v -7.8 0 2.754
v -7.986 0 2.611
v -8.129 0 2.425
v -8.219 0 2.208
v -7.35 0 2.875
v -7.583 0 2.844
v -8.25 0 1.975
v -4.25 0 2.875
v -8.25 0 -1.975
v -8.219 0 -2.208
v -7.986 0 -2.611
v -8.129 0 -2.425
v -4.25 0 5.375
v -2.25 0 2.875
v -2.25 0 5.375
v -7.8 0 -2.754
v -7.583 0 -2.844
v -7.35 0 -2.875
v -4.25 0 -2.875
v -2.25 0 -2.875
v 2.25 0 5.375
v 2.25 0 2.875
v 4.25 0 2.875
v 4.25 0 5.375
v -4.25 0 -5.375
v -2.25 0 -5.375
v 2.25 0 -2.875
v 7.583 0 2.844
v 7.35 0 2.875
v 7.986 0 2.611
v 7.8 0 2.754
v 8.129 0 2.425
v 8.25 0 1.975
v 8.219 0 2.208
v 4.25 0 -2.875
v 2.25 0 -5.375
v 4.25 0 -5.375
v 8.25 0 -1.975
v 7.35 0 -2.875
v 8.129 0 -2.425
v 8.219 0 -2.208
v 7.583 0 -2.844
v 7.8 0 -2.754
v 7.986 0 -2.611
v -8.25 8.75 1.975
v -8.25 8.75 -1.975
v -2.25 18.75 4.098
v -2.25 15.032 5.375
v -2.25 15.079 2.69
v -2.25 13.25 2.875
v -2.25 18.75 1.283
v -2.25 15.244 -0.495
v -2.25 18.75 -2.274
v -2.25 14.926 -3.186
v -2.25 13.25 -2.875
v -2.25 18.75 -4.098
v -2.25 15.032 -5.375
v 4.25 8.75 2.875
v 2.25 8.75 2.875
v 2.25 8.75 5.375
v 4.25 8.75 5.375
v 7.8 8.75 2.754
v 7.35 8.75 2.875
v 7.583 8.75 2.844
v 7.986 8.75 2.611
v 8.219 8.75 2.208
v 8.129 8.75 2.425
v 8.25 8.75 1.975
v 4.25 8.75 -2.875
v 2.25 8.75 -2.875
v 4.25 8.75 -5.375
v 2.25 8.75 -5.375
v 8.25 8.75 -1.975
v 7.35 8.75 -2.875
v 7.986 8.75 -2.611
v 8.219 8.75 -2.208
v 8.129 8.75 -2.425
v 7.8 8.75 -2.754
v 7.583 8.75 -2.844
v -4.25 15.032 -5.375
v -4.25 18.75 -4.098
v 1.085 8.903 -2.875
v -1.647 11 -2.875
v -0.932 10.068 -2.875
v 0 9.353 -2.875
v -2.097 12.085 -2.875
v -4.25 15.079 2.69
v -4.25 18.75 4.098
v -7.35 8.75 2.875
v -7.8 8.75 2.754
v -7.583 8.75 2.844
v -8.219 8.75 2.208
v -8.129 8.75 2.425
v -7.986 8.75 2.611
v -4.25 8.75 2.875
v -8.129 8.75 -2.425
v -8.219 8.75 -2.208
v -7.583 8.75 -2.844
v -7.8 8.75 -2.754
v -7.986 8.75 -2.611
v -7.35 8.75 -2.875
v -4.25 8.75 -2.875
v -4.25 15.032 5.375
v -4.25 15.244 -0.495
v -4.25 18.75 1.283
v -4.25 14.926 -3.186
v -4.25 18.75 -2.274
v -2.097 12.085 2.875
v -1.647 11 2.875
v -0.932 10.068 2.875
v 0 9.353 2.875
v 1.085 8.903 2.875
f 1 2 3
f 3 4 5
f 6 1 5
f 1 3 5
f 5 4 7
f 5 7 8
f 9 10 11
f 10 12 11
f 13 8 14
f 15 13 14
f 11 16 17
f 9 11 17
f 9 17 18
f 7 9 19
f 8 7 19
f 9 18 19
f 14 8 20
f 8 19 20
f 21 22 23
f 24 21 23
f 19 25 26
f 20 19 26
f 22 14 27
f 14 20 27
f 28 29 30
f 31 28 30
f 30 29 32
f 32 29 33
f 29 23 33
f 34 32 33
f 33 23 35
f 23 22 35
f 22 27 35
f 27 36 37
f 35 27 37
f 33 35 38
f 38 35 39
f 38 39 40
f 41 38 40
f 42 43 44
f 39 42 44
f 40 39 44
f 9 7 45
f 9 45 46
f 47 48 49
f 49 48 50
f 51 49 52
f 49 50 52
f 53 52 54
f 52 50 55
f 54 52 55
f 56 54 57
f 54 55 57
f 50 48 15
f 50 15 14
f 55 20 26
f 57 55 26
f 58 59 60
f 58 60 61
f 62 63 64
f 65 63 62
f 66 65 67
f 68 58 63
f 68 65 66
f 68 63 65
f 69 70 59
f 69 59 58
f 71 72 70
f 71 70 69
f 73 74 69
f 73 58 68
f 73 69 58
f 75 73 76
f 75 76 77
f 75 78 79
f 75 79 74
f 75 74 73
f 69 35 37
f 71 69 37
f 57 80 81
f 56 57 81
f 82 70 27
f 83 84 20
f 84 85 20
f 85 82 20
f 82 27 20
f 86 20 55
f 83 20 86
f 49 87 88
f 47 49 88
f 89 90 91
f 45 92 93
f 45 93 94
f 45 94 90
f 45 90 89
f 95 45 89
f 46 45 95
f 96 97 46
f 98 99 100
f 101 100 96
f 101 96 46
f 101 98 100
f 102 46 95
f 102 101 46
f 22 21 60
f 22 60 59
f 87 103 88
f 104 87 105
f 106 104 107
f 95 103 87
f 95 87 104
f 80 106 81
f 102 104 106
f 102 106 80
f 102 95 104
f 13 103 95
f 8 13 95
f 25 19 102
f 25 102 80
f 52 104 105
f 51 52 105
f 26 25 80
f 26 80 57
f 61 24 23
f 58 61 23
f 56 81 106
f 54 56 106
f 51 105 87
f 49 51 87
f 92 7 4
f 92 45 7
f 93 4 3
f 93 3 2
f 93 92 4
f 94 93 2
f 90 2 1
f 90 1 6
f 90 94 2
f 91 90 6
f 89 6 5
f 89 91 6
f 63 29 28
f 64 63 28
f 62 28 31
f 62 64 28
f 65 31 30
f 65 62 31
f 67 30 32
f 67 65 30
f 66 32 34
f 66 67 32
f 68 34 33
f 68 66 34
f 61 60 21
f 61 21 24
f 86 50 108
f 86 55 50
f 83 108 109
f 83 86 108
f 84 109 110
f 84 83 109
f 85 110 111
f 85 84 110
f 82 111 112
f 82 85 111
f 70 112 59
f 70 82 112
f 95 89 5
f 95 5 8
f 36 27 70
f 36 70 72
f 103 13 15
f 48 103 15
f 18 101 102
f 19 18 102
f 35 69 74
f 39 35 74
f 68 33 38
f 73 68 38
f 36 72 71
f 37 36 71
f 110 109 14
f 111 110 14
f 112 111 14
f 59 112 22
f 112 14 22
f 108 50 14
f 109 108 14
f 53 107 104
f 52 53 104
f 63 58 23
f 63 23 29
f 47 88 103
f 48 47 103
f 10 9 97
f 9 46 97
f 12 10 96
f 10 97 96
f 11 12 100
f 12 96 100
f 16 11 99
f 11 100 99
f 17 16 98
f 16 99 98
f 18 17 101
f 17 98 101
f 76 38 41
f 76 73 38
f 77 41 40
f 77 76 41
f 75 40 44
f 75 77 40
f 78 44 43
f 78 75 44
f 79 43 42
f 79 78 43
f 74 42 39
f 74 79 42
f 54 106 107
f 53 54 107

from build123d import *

# Parameters (mm, degrees)
SKETCH1_W           = 4
SKETCH1_H           = 5.75
SKETCH1_W_2         = 2
SKETCH1_H_2         = 2.5
SKETCH1_W_3         = 2.25
BOSS_EXTRUDE1_DEPTH = 8.75
FILLET1_R           = 0.9
SKETCH2_W           = 2
SKETCH2_H           = 10.75
BOSS_EXTRUDE2_DEPTH = 10
CUT_EXTRUDE1_DEPTH  = 13.5
FILLET2_R           = 4.5


with BuildPart() as part:
    # Sketch1 → Boss-Extrude1 (new body)
    with BuildSketch(Plane(origin=(0, 0, 0), x_dir=(1, 0, 0), z_dir=(0, 1, 0))):
        with Locations((-6.25, 0)):
            Rectangle(SKETCH1_W, SKETCH1_H)
        with Locations((-3.25, 4.125)):
            Rectangle(SKETCH1_W_2, SKETCH1_H_2)
        with Locations((-3.25, -4.125)):
            Rectangle(SKETCH1_W_2, SKETCH1_H_2)
        with Locations((-3.25, 0)):
            Rectangle(SKETCH1_W_2, SKETCH1_H)
        with Locations((-1.125, 0)):
            Rectangle(SKETCH1_W_3, SKETCH1_H)
        with Locations((1.125, 0)):
            Rectangle(SKETCH1_W_3, SKETCH1_H)
        with Locations((3.25, 4.125)):
            Rectangle(SKETCH1_W_2, SKETCH1_H_2)
        with Locations((6.25, 0)):
            Rectangle(SKETCH1_W, SKETCH1_H)
        with Locations((3.25, 0)):
            Rectangle(SKETCH1_W_2, SKETCH1_H)
        with Locations((3.25, -4.125)):
            Rectangle(SKETCH1_W_2, SKETCH1_H_2)
    extrude(amount=BOSS_EXTRUDE1_DEPTH)

    # Fillet1
    fillet1_edges = [part.edges().sort_by_distance(p)[0] for p in [
        (-8.25, 4.375, 2.875),
        (-8.25, 4.375, -2.875),
        (8.25, 4.375, -2.875),
        (8.25, 4.375, 2.875),
    ]]
    fillet(fillet1_edges, radius=FILLET1_R)

    # Sketch2 → Boss-Extrude2 (add)
    with BuildSketch(Plane(origin=(0, 8.75, 0), x_dir=(1, 0, 0), z_dir=(0, 1, 0))):
        with Locations((-3.25, 0)):
            Rectangle(SKETCH2_W, SKETCH2_H)
    extrude(amount=BOSS_EXTRUDE2_DEPTH)

    # Sketch3 → Cut-Extrude1 (cut, through all)
    with BuildSketch(Plane.ZY.offset(4.25)):
        Polygon((-5.375, 18.75), (-5.375, 15.031688137), (-4.097886003, 18.75), align=None)
        Polygon((-2.273593829, 18.75), (-4.097886003, 18.75), (-3.185739916, 14.925754612), align=None)
        Polygon((1.282681443, 18.75), (-2.273593829, 18.75), (-0.495456193, 15.243564513), align=None)
        Polygon((4.097886003, 18.75), (1.282681443, 18.75), (2.690283723, 15.079098327), align=None)
        Polygon((5.375, 18.75), (4.097886003, 18.75), (5.375, 15.031688137), align=None)
    extrude(amount=-CUT_EXTRUDE1_DEPTH, mode=Mode.SUBTRACT)

    # Fillet2
    fillet2_edges = [part.edges().sort_by_distance(p)[0] for p in [
        (-2.25, 8.75, 0),
    ]]
    fillet(fillet2_edges, radius=FILLET2_R)


solid = part.part
